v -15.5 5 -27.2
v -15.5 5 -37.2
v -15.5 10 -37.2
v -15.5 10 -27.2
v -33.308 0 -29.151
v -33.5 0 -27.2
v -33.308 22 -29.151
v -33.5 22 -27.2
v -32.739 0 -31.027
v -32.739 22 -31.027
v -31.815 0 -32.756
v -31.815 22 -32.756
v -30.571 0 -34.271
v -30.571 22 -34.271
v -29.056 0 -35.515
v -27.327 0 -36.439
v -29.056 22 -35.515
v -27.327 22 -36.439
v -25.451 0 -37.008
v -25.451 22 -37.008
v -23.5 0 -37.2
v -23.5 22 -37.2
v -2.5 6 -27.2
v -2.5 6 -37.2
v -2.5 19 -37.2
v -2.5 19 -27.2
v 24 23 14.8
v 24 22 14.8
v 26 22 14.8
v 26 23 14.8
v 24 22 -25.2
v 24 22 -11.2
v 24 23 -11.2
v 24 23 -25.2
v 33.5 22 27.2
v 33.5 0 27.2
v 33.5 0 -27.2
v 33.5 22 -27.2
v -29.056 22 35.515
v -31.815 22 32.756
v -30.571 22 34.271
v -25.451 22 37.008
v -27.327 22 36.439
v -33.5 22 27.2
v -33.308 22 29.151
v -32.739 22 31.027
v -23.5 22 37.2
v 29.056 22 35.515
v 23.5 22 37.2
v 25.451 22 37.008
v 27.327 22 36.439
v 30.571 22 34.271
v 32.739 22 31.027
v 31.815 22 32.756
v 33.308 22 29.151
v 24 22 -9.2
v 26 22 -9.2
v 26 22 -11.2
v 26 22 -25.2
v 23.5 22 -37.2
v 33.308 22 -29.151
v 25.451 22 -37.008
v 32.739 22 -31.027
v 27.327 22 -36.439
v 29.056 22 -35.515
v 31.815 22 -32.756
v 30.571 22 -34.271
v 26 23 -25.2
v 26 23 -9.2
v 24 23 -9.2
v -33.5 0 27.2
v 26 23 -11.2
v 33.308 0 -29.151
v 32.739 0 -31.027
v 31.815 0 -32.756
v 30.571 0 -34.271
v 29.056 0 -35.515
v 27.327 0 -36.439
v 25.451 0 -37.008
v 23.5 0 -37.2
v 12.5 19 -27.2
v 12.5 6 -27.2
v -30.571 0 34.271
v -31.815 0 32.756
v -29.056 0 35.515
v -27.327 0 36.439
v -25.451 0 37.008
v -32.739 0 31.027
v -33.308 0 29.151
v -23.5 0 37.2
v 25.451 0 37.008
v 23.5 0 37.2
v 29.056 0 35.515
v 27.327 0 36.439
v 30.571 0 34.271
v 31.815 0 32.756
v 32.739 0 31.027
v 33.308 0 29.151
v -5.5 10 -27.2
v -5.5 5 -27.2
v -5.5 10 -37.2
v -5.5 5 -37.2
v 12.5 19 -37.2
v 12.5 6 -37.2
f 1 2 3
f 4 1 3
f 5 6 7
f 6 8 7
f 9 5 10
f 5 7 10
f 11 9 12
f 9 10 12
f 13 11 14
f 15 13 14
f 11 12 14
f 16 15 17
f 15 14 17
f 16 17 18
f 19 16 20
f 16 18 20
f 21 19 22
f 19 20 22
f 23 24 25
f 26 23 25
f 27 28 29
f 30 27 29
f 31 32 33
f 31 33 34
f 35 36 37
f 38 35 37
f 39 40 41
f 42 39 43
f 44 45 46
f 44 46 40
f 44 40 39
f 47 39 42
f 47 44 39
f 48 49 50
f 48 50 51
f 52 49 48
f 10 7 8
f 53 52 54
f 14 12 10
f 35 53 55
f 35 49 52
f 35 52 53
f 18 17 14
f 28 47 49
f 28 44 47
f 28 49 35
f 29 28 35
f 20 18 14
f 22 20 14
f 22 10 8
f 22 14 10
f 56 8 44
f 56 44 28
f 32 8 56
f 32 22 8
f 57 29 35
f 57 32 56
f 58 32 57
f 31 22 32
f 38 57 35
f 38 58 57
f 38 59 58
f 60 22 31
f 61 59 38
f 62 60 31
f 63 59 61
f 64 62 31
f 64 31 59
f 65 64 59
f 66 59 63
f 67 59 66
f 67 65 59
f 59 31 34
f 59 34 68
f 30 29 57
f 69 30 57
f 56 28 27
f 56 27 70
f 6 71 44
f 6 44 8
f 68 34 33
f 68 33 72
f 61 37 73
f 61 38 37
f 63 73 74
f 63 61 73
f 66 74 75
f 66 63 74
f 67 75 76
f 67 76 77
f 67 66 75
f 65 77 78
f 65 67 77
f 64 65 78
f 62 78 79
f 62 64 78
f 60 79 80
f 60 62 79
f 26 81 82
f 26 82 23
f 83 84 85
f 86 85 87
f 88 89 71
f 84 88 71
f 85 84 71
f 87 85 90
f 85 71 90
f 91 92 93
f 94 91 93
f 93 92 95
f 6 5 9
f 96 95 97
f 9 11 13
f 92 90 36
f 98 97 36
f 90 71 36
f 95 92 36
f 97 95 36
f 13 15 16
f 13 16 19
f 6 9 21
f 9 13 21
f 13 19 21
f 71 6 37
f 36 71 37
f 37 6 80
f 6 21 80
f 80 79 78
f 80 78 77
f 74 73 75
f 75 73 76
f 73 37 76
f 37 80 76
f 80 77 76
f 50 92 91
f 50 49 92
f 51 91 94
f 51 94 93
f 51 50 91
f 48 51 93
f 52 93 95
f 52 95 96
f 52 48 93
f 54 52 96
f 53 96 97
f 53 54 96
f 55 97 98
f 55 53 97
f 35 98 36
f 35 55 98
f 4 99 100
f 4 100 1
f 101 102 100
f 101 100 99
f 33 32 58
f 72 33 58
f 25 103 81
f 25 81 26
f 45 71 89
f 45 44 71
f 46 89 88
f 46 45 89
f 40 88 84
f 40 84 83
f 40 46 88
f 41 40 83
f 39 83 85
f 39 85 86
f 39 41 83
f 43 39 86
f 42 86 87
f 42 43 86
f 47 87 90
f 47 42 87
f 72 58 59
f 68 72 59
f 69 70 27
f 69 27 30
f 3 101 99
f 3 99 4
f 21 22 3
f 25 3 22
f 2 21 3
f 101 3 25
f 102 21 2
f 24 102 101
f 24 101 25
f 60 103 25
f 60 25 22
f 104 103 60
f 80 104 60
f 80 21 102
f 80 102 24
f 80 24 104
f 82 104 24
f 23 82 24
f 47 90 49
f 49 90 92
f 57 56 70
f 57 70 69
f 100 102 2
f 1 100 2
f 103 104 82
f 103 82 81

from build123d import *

# Parameters (mm, degrees)
SKETCH1_W           = 67
SKETCH1_H           = 74.4
BOSS_EXTRUDE1_DEPTH = 22
FILLET1_R           = 10
SKETCH2_W           = 15
SKETCH2_H           = 13
SKETCH2_W_2         = 10
SKETCH2_H_2         = 5
CUT_EXTRUDE1_DEPTH  = 10
SKETCH3_W           = 2
SKETCH3_H           = 14
SKETCH3_H_2         = 24
BOSS_EXTRUDE2_DEPTH = 1


with BuildPart() as part:
    # Sketch1 → Boss-Extrude1 (new body)
    with BuildSketch(Plane(origin=(0, 0, 0), x_dir=(1, 0, 0), z_dir=(0, 1, 0))):
        Rectangle(SKETCH1_W, SKETCH1_H)
    extrude(amount=BOSS_EXTRUDE1_DEPTH)

    # Fillet1
    fillet1_edges = [part.edges().sort_by_distance(p)[0] for p in [
        (33.5, 11, 37.2),
        (-33.5, 11, 37.2),
        (-33.5, 11, -37.2),
        (33.5, 11, -37.2),
    ]]
    fillet(fillet1_edges, radius=FILLET1_R)

    # Sketch2 → Cut-Extrude1 (cut)
    with BuildSketch(Plane(origin=(0, 0, -37.2), x_dir=(-1, 0, 0), z_dir=(0, 0, -1))):
        with Locations((-5, 12.5)):
            Rectangle(SKETCH2_W, SKETCH2_H)
        with Locations((10.5, 7.5)):
            Rectangle(SKETCH2_W_2, SKETCH2_H_2)
    extrude(amount=-CUT_EXTRUDE1_DEPTH, mode=Mode.SUBTRACT)

    # Sketch3 → Boss-Extrude2 (add)
    with BuildSketch(Plane(origin=(0, 22, 0), x_dir=(1, 0, 0), z_dir=(0, 1, 0))):
        with Locations((25, 18.2)):
            Rectangle(SKETCH3_W, SKETCH3_H)
        with Locations((25, -2.8)):
            Rectangle(SKETCH3_W, SKETCH3_H_2)
    extrude(amount=BOSS_EXTRUDE2_DEPTH)


solid = part.part
